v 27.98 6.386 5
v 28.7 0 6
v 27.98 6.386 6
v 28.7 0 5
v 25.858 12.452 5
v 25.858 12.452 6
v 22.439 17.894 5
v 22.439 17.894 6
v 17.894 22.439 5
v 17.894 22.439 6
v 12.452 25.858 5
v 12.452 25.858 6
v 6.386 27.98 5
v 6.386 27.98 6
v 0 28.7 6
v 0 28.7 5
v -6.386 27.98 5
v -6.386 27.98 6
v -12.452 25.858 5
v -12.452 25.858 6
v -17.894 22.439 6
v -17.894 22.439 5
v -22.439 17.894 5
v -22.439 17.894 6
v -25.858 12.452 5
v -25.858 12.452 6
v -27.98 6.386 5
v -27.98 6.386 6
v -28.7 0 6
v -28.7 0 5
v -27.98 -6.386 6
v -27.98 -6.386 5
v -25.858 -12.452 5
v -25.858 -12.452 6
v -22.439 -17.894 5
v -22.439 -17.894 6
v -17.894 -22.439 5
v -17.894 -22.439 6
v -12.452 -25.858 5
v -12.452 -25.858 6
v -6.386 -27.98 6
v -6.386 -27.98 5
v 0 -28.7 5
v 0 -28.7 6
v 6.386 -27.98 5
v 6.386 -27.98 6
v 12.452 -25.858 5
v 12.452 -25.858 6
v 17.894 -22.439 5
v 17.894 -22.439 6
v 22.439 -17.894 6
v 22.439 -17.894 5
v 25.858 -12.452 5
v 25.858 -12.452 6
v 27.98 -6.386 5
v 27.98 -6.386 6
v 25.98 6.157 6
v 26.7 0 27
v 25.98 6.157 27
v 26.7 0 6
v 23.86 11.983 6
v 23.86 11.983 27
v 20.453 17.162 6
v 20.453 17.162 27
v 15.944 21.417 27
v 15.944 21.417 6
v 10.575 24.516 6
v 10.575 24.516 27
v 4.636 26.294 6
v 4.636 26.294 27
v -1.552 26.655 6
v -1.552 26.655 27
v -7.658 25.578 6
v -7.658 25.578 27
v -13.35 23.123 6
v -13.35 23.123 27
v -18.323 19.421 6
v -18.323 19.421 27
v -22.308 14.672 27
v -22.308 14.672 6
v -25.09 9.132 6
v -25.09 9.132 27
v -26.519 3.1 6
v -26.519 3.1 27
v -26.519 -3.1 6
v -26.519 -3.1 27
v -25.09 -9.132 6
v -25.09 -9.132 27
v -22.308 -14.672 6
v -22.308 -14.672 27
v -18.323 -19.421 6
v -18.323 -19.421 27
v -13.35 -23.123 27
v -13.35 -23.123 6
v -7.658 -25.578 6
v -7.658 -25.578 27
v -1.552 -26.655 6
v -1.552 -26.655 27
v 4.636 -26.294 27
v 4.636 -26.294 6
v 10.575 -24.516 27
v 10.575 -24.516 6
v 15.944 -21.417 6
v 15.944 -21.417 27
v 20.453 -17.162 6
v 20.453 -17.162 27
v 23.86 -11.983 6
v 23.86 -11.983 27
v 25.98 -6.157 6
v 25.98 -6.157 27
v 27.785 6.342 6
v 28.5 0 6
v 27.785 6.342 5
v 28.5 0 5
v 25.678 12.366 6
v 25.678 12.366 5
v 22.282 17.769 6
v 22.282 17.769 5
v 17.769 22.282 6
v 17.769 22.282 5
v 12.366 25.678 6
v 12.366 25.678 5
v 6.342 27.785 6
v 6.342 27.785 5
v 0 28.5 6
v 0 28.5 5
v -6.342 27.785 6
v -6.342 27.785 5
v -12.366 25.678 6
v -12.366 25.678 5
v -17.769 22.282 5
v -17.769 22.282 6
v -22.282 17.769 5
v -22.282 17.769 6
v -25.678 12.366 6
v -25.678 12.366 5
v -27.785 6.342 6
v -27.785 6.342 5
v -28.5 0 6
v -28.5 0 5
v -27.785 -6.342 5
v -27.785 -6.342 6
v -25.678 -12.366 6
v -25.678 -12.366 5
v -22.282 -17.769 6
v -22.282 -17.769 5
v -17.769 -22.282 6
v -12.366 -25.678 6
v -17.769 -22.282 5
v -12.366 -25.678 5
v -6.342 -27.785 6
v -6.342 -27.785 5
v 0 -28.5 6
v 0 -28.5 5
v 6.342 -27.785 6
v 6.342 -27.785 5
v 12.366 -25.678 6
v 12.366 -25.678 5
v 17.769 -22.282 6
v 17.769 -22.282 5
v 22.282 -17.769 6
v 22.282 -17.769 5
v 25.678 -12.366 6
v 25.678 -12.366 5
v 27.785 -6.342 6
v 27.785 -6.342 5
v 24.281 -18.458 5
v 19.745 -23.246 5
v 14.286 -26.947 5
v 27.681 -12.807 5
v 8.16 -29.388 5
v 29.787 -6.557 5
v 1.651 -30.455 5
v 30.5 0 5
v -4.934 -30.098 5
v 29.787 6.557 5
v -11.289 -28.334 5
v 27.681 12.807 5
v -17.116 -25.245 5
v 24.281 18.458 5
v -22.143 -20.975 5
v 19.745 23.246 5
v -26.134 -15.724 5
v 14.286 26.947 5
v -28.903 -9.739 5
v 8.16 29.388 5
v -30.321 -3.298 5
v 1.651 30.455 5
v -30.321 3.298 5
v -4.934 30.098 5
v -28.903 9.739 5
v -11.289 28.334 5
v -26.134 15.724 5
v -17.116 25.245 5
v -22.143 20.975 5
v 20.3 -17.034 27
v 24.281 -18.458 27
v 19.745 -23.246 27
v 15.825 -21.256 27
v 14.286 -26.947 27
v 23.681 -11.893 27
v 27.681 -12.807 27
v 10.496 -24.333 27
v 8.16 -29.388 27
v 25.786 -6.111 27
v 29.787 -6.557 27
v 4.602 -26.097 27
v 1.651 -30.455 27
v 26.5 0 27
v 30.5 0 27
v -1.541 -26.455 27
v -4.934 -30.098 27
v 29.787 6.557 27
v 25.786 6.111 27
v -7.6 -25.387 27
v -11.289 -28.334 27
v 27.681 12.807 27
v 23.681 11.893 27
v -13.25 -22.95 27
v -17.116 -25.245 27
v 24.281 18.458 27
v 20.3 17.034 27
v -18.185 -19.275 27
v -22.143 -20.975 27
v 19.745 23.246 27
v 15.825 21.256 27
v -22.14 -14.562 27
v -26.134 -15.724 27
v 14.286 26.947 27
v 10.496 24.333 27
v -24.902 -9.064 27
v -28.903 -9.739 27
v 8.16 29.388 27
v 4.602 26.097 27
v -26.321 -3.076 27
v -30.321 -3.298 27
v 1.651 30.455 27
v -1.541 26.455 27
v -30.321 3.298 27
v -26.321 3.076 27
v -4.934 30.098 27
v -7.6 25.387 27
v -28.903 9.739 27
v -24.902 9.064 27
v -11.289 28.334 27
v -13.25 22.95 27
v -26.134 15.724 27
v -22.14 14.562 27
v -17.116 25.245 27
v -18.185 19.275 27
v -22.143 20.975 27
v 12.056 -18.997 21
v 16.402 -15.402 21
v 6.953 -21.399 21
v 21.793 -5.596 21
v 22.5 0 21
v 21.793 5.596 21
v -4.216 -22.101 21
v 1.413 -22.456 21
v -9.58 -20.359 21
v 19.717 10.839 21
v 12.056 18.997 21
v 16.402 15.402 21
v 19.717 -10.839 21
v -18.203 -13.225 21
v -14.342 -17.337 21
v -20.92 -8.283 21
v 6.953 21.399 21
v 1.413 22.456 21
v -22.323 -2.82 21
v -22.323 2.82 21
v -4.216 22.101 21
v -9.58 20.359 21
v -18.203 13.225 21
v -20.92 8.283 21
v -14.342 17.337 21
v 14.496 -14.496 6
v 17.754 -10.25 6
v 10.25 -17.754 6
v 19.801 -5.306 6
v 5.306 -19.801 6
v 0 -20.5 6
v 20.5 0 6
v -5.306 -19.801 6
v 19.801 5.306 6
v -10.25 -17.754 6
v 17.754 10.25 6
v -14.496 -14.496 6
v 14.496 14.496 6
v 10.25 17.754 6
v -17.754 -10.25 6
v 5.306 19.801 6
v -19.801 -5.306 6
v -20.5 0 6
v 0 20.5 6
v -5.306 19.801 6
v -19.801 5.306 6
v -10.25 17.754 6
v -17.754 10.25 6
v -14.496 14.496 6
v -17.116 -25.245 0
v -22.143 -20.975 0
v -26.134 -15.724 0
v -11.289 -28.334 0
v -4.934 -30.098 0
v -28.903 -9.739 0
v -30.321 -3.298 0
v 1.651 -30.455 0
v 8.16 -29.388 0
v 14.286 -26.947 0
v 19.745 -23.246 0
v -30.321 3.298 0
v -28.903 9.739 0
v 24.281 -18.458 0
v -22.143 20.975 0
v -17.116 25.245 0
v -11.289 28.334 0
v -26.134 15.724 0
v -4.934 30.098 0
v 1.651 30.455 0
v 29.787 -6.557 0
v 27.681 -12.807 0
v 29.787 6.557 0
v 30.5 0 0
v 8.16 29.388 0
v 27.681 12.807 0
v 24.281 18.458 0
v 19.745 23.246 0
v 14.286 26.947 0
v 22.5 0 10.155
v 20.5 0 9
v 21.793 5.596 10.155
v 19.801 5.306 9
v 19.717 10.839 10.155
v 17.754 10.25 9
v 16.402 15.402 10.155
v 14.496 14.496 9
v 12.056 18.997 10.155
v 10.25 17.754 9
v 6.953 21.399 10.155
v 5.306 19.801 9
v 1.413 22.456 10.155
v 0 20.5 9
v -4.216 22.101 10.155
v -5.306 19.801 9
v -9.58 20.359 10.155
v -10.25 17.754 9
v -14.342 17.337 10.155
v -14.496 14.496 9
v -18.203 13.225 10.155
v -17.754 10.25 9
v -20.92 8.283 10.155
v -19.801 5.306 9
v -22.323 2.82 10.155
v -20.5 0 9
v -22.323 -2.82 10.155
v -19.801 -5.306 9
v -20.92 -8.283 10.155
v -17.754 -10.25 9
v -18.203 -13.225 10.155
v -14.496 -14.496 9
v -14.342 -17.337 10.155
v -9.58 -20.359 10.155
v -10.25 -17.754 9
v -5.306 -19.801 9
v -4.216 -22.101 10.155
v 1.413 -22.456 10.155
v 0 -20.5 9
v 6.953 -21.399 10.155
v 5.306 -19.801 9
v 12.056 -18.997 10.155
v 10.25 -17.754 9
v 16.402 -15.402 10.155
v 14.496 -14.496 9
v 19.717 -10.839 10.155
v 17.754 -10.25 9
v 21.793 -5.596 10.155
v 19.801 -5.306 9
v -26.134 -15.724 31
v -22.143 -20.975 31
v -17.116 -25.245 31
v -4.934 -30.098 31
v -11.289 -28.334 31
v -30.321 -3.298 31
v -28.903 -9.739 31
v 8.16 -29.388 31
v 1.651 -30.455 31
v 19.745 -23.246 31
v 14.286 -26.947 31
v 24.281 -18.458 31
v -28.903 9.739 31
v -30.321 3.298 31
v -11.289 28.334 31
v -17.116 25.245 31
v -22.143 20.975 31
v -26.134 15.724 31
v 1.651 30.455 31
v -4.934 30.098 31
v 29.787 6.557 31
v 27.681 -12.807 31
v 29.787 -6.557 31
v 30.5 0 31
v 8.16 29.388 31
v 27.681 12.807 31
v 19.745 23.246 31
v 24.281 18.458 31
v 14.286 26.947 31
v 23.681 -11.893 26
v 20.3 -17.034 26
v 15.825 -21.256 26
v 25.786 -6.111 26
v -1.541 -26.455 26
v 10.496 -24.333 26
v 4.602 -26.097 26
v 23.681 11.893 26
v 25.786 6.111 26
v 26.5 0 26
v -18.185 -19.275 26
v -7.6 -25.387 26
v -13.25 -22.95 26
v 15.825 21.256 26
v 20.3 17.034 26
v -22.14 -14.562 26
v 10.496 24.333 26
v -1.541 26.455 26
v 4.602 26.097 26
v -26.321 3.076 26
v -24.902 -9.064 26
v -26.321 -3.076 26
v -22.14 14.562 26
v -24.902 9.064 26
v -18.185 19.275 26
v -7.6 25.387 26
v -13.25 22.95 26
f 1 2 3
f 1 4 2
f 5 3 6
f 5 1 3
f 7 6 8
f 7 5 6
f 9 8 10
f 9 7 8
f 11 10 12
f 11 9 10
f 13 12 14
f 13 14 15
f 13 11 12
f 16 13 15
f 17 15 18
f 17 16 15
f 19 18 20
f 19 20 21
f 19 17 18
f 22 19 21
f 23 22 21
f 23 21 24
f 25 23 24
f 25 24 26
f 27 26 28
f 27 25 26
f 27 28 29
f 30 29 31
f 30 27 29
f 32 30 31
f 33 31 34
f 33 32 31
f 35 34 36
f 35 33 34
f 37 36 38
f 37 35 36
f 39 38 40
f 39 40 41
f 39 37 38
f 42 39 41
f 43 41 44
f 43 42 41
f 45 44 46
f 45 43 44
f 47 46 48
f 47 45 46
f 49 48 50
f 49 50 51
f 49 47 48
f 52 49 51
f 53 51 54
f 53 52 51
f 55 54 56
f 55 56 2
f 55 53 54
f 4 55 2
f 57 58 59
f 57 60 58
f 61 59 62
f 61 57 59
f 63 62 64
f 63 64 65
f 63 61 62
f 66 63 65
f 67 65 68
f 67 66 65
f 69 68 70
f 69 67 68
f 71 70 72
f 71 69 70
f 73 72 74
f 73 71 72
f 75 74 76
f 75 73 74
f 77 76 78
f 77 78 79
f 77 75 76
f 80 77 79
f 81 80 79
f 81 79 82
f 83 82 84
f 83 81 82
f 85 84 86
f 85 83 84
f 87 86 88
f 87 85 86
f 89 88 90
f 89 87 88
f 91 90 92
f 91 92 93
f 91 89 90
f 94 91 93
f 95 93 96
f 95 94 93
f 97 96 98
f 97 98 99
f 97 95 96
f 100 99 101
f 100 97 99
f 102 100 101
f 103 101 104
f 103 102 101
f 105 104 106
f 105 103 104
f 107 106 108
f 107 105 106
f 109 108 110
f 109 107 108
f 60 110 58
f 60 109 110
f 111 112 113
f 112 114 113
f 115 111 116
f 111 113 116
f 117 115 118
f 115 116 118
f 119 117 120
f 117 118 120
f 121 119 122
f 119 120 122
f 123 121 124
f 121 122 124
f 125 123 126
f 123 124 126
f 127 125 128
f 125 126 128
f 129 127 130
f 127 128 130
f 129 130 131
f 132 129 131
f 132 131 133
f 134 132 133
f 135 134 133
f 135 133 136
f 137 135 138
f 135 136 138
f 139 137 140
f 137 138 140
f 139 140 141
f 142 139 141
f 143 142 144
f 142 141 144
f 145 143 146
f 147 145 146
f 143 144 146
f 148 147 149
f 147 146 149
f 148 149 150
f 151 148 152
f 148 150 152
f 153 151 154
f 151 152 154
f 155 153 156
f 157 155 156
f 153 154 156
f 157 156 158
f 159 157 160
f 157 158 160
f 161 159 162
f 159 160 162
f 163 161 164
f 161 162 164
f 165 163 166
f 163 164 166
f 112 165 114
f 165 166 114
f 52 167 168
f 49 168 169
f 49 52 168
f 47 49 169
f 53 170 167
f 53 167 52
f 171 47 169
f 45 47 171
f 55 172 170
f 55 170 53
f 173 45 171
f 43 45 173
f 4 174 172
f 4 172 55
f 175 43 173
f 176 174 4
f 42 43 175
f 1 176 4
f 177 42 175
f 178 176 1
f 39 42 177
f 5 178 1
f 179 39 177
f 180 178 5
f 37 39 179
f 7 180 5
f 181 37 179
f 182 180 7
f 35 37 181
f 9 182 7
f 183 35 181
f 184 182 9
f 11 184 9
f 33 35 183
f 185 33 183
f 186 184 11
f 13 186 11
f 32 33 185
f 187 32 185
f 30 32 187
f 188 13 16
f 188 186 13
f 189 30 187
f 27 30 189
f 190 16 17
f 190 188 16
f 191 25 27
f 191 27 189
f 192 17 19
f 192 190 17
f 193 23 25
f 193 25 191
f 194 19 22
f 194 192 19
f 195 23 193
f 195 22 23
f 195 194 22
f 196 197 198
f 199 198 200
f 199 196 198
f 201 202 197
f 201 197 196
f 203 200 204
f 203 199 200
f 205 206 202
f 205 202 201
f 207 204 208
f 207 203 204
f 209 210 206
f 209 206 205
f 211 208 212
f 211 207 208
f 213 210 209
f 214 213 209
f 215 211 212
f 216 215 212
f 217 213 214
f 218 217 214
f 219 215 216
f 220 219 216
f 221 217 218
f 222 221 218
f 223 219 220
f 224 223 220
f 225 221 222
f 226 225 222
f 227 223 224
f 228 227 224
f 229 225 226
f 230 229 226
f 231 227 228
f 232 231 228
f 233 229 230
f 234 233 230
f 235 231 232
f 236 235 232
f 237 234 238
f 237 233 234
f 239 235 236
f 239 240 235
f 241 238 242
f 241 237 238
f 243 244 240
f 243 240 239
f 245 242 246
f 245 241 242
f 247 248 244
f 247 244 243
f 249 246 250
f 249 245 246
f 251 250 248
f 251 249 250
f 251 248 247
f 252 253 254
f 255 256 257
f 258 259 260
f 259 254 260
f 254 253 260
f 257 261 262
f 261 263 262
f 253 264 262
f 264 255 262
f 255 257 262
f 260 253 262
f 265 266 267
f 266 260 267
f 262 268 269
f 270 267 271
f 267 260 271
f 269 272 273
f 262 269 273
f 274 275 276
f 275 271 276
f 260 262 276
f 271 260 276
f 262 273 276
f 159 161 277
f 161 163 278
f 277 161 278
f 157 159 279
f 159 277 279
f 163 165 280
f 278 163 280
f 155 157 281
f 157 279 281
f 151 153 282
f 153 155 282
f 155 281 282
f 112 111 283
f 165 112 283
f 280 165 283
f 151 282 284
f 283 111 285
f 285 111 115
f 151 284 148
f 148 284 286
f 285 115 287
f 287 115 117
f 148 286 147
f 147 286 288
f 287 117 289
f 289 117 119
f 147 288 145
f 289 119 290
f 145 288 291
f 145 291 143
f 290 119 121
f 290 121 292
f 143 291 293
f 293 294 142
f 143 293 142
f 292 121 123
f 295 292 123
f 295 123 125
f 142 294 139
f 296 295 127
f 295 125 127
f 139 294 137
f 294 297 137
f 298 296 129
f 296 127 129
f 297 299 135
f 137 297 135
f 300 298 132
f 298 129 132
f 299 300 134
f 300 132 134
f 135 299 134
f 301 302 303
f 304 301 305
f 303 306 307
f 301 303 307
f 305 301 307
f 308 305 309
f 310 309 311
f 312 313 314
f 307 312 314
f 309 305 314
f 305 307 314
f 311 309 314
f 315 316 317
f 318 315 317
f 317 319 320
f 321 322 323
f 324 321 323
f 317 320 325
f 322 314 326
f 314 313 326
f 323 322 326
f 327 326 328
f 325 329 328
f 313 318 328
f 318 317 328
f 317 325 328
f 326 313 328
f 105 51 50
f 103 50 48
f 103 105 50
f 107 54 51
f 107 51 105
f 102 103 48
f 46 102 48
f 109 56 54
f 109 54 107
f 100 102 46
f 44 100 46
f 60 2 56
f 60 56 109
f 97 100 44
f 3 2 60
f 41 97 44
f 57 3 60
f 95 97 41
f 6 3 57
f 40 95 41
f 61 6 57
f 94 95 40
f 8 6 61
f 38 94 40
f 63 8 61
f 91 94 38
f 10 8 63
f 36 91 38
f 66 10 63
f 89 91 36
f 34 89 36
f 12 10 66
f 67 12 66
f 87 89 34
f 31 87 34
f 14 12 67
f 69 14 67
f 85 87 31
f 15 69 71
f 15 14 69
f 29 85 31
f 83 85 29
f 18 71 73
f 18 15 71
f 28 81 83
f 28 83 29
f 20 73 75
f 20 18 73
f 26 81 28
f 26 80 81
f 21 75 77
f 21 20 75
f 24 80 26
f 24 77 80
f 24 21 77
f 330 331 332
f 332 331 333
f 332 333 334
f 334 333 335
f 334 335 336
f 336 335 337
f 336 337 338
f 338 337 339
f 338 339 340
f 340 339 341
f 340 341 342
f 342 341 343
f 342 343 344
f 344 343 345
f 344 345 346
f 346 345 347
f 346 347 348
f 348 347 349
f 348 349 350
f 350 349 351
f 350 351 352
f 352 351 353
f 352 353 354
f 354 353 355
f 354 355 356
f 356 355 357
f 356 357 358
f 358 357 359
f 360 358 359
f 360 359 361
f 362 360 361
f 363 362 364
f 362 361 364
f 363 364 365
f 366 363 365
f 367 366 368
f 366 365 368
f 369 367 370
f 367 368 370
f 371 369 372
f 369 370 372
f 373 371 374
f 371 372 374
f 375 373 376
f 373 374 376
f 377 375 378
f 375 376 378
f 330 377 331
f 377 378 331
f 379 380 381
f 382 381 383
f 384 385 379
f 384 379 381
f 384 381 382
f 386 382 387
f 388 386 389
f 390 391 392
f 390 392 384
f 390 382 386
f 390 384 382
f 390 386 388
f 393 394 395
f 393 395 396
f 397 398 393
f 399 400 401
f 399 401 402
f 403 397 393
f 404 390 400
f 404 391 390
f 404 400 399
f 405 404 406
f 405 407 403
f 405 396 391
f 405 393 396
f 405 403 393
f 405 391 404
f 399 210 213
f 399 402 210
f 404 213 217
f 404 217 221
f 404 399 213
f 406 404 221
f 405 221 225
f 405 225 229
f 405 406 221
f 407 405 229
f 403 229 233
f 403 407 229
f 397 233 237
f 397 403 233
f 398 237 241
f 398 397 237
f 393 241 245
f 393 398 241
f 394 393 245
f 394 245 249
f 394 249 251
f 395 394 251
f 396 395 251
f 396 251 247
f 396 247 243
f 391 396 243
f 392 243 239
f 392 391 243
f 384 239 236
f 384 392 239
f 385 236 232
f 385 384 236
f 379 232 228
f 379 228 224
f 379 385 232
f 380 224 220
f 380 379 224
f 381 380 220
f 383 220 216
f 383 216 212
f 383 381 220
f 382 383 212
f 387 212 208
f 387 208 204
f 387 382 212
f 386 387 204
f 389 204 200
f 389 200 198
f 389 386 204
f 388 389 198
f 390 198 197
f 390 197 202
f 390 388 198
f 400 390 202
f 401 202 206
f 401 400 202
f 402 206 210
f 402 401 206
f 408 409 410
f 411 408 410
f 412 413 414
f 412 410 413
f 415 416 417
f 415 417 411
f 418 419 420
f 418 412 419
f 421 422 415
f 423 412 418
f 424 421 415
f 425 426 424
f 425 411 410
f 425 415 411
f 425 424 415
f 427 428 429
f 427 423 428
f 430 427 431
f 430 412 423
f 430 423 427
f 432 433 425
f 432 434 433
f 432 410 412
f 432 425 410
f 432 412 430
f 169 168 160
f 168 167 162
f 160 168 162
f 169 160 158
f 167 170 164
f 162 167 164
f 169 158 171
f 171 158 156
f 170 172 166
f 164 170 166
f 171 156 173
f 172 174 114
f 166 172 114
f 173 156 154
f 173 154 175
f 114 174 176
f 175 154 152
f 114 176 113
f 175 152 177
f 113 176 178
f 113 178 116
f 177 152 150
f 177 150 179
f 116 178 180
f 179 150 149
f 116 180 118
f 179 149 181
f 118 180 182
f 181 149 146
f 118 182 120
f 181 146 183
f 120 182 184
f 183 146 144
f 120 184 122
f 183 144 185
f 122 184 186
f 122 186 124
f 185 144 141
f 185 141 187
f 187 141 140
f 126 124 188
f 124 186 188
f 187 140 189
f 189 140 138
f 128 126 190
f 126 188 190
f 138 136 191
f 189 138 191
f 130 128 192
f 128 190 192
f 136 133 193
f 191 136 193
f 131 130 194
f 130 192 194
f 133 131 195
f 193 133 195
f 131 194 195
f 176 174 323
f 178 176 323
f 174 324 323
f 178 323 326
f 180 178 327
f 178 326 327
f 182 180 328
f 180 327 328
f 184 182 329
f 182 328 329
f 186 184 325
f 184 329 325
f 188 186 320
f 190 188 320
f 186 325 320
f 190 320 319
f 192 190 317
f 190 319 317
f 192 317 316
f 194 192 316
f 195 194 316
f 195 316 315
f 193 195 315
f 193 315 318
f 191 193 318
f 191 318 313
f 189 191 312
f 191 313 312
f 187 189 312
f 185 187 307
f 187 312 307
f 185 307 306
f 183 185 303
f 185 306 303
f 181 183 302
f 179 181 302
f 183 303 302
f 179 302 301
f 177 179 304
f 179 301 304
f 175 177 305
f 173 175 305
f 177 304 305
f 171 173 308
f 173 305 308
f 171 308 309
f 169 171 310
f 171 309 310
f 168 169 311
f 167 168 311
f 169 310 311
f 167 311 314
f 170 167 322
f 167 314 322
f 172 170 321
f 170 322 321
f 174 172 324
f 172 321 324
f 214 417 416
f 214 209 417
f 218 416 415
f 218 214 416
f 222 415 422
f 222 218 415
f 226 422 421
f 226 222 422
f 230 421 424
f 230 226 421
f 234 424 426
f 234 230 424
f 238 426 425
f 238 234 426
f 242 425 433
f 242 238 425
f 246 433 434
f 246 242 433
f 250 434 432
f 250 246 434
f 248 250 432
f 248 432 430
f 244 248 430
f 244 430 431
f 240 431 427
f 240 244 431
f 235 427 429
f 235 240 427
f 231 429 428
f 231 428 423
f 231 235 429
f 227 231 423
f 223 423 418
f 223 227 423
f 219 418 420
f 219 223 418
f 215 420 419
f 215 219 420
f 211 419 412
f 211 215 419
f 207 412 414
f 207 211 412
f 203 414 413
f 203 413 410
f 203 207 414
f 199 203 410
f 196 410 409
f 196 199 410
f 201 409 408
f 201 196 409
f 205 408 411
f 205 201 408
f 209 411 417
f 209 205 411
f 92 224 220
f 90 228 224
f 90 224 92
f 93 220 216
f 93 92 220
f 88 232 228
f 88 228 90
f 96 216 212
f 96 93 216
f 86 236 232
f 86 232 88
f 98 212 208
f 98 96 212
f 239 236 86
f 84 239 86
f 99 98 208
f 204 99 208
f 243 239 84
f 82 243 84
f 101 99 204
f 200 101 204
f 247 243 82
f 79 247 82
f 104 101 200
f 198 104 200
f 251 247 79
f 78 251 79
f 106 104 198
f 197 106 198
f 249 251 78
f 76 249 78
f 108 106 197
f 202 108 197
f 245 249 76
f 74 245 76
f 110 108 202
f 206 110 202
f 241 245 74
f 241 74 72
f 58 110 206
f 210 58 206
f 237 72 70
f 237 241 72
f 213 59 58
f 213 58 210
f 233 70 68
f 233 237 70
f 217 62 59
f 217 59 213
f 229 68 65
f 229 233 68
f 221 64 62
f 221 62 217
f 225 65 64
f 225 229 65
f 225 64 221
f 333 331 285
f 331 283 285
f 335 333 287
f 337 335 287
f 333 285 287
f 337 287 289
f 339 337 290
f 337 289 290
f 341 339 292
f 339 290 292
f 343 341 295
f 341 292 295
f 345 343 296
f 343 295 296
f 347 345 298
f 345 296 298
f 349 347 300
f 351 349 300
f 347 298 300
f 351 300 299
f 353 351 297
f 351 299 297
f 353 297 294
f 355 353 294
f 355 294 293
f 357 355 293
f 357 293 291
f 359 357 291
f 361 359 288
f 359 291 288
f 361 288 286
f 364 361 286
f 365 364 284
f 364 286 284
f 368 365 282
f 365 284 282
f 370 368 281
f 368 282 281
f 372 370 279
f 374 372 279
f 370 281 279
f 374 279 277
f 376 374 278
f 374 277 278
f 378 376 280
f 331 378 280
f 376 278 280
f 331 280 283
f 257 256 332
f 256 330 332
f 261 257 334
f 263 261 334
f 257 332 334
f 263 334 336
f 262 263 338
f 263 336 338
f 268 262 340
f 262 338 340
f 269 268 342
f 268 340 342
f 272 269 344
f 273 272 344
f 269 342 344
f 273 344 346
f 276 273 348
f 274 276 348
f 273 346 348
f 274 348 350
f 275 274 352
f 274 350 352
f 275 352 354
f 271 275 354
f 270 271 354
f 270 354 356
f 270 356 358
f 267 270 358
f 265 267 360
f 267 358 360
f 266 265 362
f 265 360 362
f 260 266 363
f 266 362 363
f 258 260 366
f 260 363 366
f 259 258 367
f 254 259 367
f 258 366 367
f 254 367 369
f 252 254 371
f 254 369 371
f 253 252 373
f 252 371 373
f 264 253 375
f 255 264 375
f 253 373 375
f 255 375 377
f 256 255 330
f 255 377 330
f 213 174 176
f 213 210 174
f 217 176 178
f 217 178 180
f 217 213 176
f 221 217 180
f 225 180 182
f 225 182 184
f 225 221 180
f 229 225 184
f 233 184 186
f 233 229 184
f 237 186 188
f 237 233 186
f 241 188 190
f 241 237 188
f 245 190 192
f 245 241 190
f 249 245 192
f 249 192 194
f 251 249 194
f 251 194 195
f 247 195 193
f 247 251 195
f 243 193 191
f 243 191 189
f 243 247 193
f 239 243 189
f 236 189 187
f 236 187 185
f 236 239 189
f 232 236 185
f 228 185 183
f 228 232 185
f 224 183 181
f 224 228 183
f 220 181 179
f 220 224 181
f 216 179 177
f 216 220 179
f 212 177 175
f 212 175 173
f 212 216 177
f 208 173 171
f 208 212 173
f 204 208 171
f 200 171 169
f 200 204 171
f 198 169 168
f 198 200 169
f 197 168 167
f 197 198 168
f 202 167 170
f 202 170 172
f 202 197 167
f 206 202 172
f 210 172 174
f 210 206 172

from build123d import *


with BuildPart() as body:
    # Sketch → Revolution (revolve)
    with BuildSketch(Plane.XZ):
        Polygon((0, 0), (0, 21), (22.5, 21), (22.5, 10.154701), (20.5, 9), (20.5, 6), (28.5, 6), (28.5, 5), (30.5, 5), (30.5, 0), align=None)
    revolve(axis=Axis((0, 0, 0), (0, 0, 1)))


with BuildPart() as body001:
    # Sketch001 → Revolution001 (revolve)
    with BuildSketch(Plane.XZ):
        Polygon((28.7, 6), (28.7, 5), (30.5, 5), (30.5, 27), (26.7, 27), (26.7, 6), align=None)
    revolve(axis=Axis((0, 0, 0), (0, 0, 1)))


with BuildPart() as body002:
    # Sketch002 → Revolution002 (revolve)
    with BuildSketch(Plane.XZ):
        Polygon((0, 26), (26.5, 26), (26.5, 27), (30.5, 27), (30.5, 31), (0, 31), align=None)
    revolve(axis=Axis((0, 0, 0), (0, 0, 1)))


solid = Compound([body.part, body001.part, body002.part])
